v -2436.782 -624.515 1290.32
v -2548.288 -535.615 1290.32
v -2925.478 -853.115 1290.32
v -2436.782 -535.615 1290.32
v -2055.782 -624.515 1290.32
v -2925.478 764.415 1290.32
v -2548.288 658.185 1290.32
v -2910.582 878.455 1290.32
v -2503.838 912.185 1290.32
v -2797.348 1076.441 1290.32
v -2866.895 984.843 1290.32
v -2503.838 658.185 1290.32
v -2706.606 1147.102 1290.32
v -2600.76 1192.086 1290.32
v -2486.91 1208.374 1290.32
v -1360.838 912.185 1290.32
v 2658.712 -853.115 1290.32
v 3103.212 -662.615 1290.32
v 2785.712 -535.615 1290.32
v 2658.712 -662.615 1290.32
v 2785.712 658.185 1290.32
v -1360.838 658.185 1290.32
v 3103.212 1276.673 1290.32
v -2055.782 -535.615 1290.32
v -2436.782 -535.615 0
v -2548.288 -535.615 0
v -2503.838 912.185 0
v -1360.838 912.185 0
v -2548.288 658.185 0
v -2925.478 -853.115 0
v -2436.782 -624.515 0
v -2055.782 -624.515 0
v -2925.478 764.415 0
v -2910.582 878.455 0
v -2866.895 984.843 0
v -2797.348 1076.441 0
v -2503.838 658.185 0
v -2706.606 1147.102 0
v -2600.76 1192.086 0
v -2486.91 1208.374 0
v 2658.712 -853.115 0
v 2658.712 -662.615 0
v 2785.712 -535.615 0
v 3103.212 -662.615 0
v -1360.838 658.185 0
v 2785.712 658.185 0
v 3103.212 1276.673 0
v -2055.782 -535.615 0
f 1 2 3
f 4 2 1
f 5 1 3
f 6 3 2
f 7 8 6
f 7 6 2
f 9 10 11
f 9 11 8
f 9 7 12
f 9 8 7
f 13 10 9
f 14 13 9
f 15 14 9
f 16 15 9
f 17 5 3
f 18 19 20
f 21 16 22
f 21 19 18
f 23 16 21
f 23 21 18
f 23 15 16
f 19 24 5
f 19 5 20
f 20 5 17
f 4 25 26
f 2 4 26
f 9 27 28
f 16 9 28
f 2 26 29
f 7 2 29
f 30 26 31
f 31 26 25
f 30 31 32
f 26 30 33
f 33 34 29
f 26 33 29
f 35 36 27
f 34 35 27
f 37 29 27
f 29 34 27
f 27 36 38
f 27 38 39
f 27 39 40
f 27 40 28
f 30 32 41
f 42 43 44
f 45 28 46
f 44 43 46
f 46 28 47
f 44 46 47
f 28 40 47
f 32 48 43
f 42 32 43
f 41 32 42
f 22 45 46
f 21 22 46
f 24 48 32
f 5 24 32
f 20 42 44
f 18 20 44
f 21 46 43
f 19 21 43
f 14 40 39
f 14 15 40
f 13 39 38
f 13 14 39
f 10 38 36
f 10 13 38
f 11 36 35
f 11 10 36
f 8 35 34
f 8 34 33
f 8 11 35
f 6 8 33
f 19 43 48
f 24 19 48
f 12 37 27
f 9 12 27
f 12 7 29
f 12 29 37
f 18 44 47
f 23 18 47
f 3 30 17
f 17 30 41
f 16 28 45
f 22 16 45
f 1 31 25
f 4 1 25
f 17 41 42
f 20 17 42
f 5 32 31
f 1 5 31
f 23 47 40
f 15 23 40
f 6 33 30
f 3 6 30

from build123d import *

# Parameters (mm, degrees)
F1_DEPTH = 1290.32
F2_R     = 443.992


with BuildPart() as f1:
    # F0 (on Top) → F1 (new body)
    with BuildSketch(Plane.XY):
        Polygon((3103.212074, -662.61454), (3103.212074, 1203.01546), (-2925.477926, 1203.01546), (-2925.477926, -853.11454), (2658.712074, -853.11454), (2658.712074, -662.61454), align=None)
        Polygon((-2436.781926, -535.61454), (-2548.287926, -535.61454), (-2548.287926, 658.18546), (-2503.837926, 658.18546), (-2503.837926, 912.18546), (-1360.837926, 912.18546), (-1360.837926, 658.18546), (2785.712074, 658.18546), (2785.712074, -27.61454), (2785.712074, -535.61454), (-1849.787926, -535.61454), (-2055.781926, -535.61454), (-2055.781926, -624.51454), (-2436.781926, -624.51454), align=None, mode=Mode.SUBTRACT)
        Polygon((-2925.477926, 1203.01546), (3103.212074, 1203.01546), (3103.212074, 1276.673468), align=None)
    extrude(amount=F1_DEPTH)

    # F2
    f2_edges = [f1.edges().sort_by_distance(p)[0] for p in [
        (-2925.477926, 1203.01546, 645.16),
    ]]
    fillet(f2_edges, radius=F2_R)


solid = f1.part
